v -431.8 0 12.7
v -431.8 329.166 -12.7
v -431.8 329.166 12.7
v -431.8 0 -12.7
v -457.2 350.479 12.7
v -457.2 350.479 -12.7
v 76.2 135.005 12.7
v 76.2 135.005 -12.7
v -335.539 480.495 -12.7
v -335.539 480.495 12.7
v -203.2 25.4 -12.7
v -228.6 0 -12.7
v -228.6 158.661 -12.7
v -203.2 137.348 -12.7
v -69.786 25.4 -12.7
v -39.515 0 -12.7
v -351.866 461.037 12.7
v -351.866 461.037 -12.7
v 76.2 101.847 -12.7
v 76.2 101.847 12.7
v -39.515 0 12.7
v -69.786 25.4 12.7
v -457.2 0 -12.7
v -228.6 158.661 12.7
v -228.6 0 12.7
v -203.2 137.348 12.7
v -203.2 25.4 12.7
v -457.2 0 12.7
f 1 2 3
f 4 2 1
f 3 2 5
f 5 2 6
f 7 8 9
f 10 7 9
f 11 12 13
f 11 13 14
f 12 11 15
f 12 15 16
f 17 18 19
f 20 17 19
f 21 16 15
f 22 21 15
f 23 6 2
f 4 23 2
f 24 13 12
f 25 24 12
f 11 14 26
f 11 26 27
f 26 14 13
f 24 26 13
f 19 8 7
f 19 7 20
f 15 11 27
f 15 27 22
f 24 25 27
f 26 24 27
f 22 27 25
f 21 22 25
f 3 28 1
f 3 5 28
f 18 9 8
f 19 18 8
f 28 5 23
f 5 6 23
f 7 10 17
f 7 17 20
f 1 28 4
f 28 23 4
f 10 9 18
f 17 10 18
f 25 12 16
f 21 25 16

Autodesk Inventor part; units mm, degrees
ref_plane "YZ Plane" through (0, 0, 0) normal (1, 0, 0) x (0, 1, 0)
ref_plane "XZ Plane" through (0, 0, 0) normal (0, 1, 0) x (-1, 0, 0)
ref_plane "XY Plane" through (0, 0, 0) normal (0, 0, 1) x (1, 0, 0)
sketch "Sketch1" plane through (0, 0, 0) normal (0, 0, 1) x (1, 0, 0)
  line L0 (0, 0) -> (-228.6, 0) construction
  line L1 (0, 0) -> (-39.5154, 0)
  line L2 (-457.2, 350.479) -> (-457.2, 0)
  line L3 (-431.8, 329.1659) -> (-431.8, 0)
  line L4 (-228.6, 158.6608) -> (-228.6, 0)
  line L5 (-203.2, 137.3477) -> (-203.2, 0)
  line L6 (-457.2, 0) -> (-431.8, 0)
  line L7 (-228.6, 0) -> (-203.2, 0)
  line L8 (-203.2, 0) -> (-39.5154, 0)
  line L9 (-203.2, 25.4) -> (-69.7859, 25.4)
  line L10 (-351.8656, 461.0371) -> (76.2, 101.8473)
  line L11 (76.2, 135.0047) -> (-335.5388, 480.4946)
  line L12 (-335.5388, 480.4946) -> (-351.8656, 461.0371)
  line L13 (0, 0) -> (0, 391.6762) construction
  line L14 (76.2, 135.0047) -> (76.2, 101.8473)
  line L15 (-431.8, 329.1659) -> (-457.2, 350.479)
  line L16 (-39.5154, 0) -> (-69.7859, 25.4)
  line L17 (-203.2, 137.3477) -> (-228.6, 158.6608)
  dimension "d19" = 25.4
  dimension "d21" = 25.4
  dimension "d27" = 25.4
  dimension "d29" = 76.2
  dimension "d30" = 558.8
  dimension "d31" = 25.4
  dimension "d34" = 350.479
  dimension "d35" = 158.6608
  dimension "d36" = 163.6846
extrude "Extrusion1" add sketch "Sketch1" along normal mid plane 25.4
properties part number "newFrame1x2pieces"
